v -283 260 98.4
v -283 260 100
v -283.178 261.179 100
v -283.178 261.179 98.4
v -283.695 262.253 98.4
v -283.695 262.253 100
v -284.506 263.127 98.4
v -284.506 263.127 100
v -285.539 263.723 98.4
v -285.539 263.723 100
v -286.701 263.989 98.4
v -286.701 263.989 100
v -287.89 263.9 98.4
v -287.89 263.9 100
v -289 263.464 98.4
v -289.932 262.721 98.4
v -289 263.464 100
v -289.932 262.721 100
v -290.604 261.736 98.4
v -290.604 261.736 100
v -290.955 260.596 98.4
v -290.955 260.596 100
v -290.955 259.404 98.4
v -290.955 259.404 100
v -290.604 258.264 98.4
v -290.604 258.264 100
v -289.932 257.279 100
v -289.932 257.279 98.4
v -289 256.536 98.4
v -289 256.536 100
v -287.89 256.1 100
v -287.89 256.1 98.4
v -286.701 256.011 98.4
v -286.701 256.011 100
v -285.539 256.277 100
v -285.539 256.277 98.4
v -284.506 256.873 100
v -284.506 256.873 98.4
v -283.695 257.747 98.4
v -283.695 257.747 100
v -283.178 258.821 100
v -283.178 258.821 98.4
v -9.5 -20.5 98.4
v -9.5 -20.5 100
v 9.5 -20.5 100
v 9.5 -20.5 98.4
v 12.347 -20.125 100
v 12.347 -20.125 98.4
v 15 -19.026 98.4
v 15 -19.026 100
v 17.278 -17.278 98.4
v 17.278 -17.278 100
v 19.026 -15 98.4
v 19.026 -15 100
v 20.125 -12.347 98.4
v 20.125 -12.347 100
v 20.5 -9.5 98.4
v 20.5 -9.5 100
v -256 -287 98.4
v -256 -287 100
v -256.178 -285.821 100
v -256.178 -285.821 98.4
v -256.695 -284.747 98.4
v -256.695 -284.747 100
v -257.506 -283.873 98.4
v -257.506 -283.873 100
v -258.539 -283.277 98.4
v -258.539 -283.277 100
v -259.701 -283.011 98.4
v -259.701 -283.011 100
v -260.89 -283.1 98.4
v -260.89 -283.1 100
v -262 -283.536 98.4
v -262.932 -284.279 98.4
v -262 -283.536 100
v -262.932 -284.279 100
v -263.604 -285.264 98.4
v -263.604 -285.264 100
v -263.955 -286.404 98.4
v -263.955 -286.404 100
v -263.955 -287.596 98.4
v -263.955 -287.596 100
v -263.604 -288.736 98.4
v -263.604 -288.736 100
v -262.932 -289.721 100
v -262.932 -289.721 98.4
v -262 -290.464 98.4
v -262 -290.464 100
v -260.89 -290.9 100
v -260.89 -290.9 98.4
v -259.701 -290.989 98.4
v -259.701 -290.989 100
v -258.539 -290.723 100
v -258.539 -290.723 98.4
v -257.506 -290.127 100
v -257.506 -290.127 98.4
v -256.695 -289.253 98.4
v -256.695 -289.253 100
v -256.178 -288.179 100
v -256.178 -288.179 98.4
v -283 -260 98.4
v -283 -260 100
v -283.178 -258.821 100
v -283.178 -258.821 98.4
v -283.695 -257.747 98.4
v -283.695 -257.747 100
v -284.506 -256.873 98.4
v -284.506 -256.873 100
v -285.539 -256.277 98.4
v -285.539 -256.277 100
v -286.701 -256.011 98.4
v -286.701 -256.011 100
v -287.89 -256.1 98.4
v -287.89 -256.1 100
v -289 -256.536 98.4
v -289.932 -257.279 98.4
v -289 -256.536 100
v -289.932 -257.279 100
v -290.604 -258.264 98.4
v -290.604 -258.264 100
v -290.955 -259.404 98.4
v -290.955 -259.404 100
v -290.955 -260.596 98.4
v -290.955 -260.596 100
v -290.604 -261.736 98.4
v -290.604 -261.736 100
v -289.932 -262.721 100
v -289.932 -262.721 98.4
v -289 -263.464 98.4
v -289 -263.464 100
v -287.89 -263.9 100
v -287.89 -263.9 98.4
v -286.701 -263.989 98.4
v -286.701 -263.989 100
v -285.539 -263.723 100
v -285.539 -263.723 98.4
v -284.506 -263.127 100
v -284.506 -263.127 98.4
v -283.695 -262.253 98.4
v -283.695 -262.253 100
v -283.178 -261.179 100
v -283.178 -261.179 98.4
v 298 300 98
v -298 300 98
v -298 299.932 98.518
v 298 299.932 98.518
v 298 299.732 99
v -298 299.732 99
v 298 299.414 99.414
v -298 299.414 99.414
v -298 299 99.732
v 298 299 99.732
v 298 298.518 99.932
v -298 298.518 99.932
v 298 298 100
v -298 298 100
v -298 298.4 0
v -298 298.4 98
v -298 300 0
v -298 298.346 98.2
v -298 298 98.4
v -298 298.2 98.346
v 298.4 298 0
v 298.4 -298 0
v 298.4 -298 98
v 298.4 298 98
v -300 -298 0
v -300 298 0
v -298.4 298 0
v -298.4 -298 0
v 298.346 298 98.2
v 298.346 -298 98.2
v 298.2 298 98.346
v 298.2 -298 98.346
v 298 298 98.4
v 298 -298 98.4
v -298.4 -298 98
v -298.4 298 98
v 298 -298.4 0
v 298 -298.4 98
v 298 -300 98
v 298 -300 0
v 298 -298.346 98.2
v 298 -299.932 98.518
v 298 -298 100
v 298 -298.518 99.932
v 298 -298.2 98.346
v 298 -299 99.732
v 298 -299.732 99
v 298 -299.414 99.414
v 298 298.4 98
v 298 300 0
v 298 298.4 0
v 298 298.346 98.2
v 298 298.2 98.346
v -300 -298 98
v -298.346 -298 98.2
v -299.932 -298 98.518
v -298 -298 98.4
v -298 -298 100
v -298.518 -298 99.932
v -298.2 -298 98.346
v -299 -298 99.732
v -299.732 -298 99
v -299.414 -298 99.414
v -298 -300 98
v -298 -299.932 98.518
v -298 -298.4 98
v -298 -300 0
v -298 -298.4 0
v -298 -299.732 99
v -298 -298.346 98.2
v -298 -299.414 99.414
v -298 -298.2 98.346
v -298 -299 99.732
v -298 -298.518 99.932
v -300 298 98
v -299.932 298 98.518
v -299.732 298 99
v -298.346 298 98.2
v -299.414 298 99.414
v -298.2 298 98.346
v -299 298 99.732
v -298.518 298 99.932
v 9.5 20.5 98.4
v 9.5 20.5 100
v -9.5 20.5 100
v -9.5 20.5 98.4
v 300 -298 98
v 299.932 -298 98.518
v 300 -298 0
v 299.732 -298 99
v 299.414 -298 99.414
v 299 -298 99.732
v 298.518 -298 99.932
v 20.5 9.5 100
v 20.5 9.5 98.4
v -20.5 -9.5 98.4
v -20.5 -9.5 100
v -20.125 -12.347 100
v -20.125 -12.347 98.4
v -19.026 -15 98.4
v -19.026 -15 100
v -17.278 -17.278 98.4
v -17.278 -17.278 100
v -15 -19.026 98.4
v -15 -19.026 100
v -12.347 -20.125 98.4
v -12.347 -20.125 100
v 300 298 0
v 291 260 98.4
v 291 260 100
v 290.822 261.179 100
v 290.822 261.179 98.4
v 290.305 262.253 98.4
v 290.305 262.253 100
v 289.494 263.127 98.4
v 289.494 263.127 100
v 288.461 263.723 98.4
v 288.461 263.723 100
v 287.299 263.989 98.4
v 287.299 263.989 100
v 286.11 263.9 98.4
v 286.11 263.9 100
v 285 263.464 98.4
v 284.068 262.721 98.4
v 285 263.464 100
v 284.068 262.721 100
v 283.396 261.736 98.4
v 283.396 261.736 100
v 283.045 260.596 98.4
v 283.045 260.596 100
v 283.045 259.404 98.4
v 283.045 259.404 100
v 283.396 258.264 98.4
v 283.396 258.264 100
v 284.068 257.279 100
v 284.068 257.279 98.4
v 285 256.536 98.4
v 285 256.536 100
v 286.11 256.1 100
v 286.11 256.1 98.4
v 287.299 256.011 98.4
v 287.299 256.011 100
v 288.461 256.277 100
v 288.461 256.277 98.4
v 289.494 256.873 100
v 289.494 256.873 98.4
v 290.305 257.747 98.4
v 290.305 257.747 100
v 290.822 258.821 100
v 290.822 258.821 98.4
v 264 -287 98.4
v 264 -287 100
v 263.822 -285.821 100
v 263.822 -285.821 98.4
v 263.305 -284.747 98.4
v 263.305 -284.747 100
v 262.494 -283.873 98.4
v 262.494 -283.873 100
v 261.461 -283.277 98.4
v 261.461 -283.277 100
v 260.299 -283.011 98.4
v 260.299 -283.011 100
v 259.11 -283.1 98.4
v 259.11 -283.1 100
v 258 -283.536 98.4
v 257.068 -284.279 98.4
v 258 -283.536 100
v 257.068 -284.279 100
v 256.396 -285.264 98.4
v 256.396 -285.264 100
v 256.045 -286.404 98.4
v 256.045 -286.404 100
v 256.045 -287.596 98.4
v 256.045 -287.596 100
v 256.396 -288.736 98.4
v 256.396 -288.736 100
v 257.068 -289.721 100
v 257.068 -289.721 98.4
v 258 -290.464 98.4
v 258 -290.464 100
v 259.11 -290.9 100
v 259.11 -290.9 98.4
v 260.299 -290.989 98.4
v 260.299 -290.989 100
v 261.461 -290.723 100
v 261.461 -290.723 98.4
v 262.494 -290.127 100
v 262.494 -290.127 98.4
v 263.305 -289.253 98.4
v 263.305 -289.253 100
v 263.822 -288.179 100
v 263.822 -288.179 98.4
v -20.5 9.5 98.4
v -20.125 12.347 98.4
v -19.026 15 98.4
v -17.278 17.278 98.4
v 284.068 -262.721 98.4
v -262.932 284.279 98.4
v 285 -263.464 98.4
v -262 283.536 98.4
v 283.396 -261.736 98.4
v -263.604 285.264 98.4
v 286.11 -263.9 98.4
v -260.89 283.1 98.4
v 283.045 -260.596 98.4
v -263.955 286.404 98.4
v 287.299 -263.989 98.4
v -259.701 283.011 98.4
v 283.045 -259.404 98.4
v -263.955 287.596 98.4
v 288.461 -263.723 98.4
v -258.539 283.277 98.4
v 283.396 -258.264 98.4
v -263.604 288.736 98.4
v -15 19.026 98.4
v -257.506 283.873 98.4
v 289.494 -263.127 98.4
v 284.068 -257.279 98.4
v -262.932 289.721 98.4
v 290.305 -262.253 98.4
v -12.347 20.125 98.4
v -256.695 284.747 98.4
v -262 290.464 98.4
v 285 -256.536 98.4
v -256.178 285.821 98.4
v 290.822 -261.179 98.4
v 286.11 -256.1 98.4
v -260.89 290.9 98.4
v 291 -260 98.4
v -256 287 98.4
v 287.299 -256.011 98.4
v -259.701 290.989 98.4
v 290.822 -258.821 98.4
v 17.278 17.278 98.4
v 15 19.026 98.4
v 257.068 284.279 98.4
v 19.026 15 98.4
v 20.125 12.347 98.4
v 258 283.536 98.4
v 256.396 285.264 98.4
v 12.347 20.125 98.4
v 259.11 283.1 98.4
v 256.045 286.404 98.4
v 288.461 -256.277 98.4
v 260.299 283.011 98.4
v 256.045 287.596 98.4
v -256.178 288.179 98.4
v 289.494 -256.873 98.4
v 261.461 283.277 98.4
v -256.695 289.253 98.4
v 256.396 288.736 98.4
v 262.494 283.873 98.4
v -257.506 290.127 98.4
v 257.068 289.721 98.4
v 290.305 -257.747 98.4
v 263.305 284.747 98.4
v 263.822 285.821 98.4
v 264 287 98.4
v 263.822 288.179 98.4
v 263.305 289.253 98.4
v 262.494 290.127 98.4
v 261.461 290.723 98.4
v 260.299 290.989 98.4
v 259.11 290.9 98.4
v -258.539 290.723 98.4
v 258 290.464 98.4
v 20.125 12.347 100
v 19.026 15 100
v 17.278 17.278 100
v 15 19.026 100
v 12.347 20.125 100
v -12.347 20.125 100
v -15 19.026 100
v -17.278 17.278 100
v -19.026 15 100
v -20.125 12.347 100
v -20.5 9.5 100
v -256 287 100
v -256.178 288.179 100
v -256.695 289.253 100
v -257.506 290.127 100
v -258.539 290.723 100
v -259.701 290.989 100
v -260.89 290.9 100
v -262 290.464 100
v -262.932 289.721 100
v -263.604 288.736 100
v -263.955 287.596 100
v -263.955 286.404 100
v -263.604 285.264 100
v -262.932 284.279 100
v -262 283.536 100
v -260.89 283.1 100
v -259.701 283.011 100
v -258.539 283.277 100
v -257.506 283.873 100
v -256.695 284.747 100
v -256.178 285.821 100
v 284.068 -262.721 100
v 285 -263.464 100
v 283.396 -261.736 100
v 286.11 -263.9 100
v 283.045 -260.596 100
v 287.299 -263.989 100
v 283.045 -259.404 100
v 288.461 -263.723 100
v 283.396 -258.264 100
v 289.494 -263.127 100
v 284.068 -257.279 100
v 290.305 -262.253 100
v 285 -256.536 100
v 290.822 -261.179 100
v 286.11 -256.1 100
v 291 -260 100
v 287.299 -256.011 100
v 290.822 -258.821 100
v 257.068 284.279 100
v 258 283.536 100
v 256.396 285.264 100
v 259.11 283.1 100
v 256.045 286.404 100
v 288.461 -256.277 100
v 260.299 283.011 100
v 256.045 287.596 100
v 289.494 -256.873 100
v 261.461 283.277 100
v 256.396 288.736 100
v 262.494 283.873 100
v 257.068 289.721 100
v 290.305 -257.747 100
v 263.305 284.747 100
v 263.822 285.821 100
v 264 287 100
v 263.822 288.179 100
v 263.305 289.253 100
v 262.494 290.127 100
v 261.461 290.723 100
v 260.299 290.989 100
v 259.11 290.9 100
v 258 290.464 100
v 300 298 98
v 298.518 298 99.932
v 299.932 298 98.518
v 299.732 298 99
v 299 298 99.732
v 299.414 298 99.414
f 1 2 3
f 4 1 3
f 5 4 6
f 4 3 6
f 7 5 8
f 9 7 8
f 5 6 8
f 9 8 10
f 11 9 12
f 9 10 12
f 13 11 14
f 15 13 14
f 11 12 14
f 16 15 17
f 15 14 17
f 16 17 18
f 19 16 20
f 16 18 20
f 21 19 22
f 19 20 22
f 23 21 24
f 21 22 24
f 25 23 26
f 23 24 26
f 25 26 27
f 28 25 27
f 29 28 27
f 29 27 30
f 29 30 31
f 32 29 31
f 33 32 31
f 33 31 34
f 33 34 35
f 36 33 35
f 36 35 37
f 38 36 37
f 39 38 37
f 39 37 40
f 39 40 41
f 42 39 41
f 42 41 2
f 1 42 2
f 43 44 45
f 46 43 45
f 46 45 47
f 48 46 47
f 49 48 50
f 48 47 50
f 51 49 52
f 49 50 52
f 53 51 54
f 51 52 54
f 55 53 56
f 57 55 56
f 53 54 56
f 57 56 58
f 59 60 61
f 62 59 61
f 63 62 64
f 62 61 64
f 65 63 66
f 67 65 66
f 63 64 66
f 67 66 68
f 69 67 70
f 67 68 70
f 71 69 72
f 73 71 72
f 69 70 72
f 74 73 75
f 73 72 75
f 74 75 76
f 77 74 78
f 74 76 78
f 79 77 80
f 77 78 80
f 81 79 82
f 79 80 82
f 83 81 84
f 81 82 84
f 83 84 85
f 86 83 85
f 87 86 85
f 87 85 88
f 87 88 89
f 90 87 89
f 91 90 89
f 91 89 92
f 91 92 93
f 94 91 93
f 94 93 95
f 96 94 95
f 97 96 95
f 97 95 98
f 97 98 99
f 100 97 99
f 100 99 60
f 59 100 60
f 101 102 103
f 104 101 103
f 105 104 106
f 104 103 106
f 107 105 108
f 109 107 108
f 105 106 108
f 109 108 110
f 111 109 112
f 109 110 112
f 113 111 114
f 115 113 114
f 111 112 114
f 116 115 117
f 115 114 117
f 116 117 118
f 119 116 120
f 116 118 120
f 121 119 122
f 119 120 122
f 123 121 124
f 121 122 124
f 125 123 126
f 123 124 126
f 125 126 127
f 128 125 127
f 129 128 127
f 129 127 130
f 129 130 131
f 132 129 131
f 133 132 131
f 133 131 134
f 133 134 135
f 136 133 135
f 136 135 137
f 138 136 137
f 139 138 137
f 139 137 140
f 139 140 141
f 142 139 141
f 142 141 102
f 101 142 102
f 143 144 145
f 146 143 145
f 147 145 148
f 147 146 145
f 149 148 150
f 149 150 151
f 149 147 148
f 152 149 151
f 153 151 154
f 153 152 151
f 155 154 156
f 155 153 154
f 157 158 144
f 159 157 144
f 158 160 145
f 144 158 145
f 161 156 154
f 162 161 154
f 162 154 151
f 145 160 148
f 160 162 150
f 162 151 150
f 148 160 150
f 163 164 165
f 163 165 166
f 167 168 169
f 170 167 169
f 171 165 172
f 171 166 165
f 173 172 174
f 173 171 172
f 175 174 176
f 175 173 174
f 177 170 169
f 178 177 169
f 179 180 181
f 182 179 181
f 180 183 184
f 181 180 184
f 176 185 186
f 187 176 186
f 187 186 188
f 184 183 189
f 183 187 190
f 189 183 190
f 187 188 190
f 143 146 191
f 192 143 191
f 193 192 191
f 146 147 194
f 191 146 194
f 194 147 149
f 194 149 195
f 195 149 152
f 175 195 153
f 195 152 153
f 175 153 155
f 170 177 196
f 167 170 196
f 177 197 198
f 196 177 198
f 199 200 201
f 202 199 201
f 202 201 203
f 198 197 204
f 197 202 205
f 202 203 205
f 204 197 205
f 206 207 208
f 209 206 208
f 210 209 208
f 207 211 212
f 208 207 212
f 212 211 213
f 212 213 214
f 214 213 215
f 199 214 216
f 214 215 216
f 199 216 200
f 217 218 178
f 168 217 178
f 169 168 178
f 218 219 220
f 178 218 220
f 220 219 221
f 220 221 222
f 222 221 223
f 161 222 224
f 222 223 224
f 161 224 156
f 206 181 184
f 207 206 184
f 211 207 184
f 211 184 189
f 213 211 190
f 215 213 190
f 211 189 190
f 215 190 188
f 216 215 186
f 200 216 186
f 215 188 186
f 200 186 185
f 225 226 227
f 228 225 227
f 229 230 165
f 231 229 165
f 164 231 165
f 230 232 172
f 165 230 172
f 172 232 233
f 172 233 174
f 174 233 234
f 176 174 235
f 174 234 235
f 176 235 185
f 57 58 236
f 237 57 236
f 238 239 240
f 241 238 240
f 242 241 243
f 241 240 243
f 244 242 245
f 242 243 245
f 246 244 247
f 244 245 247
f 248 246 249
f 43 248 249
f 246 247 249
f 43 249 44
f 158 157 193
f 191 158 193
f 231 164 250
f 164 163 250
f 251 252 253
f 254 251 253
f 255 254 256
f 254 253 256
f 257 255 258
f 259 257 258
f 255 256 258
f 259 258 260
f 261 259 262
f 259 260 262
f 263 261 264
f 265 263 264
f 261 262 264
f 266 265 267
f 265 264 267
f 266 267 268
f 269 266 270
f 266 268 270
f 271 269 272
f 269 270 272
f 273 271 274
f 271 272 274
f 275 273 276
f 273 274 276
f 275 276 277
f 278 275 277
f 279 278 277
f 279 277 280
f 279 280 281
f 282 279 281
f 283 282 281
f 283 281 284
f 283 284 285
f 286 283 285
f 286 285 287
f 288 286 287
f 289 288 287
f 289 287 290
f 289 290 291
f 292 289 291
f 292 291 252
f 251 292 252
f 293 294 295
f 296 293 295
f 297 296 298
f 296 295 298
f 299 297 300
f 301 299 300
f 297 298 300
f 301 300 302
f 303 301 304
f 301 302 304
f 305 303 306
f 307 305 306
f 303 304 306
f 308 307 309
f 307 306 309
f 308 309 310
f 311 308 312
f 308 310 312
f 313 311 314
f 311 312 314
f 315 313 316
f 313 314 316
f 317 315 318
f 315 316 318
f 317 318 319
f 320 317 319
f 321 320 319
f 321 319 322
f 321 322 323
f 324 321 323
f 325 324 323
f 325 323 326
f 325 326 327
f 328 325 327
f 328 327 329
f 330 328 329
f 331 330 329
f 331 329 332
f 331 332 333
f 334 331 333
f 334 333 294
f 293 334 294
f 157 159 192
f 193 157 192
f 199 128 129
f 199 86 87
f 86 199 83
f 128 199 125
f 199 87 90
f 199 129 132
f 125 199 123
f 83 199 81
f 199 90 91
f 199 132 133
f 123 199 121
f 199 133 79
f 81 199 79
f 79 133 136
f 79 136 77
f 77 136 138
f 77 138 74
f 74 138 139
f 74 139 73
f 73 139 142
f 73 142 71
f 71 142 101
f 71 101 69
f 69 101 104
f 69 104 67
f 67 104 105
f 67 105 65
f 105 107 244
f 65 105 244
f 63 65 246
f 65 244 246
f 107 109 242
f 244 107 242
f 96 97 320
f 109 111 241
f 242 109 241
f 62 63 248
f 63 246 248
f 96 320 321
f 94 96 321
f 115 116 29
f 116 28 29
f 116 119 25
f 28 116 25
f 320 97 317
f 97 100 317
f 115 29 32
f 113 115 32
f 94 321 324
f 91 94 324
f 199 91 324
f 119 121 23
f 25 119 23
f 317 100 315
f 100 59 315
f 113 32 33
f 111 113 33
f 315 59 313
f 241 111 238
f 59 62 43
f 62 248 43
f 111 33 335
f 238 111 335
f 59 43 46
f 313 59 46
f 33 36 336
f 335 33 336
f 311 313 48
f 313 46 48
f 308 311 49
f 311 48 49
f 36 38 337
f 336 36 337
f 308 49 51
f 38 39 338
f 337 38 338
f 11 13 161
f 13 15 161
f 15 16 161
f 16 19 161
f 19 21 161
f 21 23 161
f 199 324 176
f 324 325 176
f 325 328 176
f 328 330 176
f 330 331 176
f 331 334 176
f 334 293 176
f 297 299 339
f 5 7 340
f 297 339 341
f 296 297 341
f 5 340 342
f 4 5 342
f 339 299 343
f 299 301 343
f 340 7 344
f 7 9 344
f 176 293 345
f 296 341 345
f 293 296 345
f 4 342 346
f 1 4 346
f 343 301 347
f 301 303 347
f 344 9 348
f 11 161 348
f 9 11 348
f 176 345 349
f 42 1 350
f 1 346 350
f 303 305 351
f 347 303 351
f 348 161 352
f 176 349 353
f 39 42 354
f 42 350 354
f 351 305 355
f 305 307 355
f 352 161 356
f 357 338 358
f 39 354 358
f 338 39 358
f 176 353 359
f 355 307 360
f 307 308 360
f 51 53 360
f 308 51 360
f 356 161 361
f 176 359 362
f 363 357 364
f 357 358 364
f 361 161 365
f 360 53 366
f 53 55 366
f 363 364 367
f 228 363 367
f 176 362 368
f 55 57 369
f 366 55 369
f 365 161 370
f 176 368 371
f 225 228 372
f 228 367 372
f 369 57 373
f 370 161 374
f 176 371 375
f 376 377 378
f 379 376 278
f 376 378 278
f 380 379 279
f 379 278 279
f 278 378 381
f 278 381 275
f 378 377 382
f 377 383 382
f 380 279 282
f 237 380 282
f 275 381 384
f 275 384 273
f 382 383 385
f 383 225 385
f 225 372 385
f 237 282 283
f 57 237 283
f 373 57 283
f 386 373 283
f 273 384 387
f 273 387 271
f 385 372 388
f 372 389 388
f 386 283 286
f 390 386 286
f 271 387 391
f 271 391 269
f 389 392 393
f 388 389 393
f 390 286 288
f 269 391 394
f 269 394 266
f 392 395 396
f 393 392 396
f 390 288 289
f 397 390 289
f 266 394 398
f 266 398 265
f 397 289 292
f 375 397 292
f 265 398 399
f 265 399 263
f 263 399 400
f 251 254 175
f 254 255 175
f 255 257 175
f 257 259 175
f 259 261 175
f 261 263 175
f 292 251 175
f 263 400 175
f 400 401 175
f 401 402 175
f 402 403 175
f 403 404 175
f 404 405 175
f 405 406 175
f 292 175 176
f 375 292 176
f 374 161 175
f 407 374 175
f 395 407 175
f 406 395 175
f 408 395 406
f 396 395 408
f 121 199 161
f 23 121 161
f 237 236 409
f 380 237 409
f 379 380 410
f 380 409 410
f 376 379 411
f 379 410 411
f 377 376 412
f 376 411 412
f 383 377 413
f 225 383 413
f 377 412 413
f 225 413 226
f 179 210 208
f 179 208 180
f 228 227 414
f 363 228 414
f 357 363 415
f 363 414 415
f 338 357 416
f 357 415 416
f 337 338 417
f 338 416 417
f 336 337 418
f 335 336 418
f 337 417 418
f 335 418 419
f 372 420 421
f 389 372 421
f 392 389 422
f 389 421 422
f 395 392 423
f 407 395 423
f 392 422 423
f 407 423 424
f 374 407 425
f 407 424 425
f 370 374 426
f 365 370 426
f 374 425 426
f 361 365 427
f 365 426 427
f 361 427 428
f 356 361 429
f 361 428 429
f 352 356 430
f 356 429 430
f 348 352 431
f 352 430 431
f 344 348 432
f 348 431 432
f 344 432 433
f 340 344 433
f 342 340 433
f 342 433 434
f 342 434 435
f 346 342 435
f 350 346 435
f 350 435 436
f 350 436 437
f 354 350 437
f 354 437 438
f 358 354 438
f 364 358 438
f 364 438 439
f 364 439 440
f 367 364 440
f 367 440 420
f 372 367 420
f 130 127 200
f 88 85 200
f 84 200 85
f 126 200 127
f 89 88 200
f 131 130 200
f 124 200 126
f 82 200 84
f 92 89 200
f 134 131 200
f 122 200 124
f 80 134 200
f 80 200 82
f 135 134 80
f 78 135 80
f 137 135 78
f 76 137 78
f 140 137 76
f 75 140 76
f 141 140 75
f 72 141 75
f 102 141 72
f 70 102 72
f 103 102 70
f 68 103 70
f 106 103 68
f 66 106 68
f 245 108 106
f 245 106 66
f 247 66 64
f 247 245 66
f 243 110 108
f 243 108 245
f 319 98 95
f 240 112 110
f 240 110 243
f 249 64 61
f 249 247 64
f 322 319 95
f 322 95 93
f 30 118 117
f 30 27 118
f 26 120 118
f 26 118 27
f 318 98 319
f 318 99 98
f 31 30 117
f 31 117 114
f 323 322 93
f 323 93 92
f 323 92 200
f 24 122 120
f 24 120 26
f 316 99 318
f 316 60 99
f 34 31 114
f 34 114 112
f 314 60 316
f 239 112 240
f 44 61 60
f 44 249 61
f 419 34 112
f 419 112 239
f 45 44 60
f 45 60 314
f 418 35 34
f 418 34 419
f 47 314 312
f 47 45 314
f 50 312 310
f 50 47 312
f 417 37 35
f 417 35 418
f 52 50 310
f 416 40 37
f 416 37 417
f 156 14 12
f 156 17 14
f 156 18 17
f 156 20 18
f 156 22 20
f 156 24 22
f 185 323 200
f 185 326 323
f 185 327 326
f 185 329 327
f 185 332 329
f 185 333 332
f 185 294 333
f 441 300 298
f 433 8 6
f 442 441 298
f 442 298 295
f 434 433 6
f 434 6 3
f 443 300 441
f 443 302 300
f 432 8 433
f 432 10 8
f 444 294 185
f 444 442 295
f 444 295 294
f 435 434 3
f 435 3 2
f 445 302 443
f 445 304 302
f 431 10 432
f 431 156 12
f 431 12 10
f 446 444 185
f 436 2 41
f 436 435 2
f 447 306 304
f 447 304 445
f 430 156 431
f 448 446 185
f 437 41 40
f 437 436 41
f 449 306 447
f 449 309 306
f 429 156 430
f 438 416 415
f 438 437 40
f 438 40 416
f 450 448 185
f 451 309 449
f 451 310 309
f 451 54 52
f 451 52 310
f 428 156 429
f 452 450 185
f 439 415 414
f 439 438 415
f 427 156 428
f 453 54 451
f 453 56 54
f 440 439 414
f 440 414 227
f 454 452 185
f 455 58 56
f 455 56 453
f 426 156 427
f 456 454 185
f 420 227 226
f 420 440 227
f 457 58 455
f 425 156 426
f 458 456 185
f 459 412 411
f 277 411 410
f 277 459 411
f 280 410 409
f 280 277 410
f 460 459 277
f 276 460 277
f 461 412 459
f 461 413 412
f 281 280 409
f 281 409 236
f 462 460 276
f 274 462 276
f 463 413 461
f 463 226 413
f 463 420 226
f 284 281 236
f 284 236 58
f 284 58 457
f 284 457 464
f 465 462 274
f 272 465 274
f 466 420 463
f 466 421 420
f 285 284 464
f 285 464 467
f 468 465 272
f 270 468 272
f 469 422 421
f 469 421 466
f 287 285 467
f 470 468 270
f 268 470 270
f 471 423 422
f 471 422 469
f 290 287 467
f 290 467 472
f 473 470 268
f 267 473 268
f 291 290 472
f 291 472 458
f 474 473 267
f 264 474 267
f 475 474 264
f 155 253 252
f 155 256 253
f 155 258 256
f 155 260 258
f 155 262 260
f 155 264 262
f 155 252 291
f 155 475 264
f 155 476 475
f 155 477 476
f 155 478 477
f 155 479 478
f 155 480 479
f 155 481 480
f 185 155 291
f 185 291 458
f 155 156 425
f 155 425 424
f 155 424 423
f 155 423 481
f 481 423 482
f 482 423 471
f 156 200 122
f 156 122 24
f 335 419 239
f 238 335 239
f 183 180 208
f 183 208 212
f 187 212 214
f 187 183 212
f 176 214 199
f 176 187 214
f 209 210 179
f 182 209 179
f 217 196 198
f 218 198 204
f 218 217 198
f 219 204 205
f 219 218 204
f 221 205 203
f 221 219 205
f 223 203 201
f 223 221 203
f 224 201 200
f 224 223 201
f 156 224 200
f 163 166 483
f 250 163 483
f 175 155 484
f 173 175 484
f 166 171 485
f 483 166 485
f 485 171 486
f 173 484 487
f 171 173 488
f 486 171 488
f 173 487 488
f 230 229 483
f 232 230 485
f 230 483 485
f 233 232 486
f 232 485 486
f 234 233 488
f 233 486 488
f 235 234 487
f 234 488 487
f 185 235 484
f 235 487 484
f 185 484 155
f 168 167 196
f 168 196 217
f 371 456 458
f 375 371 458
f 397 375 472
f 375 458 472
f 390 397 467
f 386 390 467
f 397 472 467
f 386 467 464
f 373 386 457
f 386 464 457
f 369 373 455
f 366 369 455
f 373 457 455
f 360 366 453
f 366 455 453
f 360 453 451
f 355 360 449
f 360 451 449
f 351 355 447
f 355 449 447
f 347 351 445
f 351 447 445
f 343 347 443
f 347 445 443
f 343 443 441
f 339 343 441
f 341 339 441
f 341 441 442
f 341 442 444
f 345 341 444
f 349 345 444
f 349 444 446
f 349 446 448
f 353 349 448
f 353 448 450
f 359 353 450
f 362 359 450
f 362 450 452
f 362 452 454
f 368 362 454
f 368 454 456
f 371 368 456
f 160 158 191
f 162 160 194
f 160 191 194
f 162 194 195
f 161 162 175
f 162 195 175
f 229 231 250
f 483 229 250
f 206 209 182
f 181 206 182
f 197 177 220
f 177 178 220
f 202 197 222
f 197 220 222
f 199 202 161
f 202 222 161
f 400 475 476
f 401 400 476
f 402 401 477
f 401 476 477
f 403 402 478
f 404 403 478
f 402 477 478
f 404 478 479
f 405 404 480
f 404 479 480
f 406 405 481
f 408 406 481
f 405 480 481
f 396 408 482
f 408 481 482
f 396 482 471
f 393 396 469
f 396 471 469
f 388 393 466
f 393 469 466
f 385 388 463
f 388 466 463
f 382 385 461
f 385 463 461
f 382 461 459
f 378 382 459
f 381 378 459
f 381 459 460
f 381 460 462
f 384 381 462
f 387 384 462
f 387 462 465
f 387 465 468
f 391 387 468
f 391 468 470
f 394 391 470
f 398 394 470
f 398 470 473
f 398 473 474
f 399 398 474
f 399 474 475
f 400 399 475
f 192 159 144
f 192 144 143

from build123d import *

# Parameters (mm, degrees)
F0_W      = 600
F0_H      = 600
F1_DEPTH  = 100
F3_R      = 2
F4_T      = -1.6
F6_DEPTH  = 100.001
F8_DEPTH  = 100.001
F9_R      = 4
F10_DEPTH = 100.001


with BuildPart() as f1:
    # F0 (on Top) → F1 (new body)
    with BuildSketch(Plane.XY):
        Rectangle(F0_W, F0_H)
    extrude(amount=F1_DEPTH)

    # F3
    f3_edges = [f1.edges().sort_by_distance(p)[0] for p in [
        (0, -300, 100),
        (-300, -300, 50),
        (-300, 0, 100),
        (300, -300, 50),
        (-300, 300, 50),
        (300, 0, 100),
        (0, 300, 100),
        (300, 300, 50),
    ]]
    fillet(f3_edges, radius=F3_R)

    # F4
    f4_openings = [f1.faces().sort_by_distance(p)[0] for p in [
        (0, 0, 0),
    ]]
    offset(amount=F4_T, openings=f4_openings)

    # F5 (on face) → F6 (cut, through all)
    with BuildSketch(Plane.XY.offset(100)):
        with BuildLine():
            Line((298, 300), (298, 298))
            Line((298, 298), (300, 298))
            ThreePointArc((300, 298), (299.414214, 299.414214), (298, 300))
        make_face()
        with BuildLine():
            Line((298, -298), (298, -300))
            ThreePointArc((298, -300), (299.414214, -299.414214), (300, -298))
            Line((300, -298), (298, -298))
        make_face()
        with BuildLine():
            Line((-300, 298), (-298, 298))
            Line((-298, 298), (-298, 300))
            ThreePointArc((-298, 300), (-299.414214, 299.414214), (-300, 298))
        make_face()
        with BuildLine():
            ThreePointArc((-300, -298), (-299.414214, -299.414214), (-298, -300))
            Line((-298, -300), (-298, -298))
            Line((-298, -298), (-300, -298))
        make_face()
    extrude(amount=-F6_DEPTH, mode=Mode.SUBTRACT)

    # F7 (on face) → F8 (cut, through all)
    with BuildSketch(Plane.XY.offset(100)):
        with BuildLine():
            ThreePointArc((-20.5, -9.5), (-17.278175, -17.278175), (-9.5, -20.5))
            Line((-9.5, -20.5), (9.5, -20.5))
            ThreePointArc((9.5, -20.5), (17.278175, -17.278175), (20.5, -9.5))
            Line((20.5, -9.5), (20.5, 9.5))
            ThreePointArc((20.5, 9.5), (17.278175, 17.278175), (9.5, 20.5))
            Line((9.5, 20.5), (-9.5, 20.5))
            ThreePointArc((-9.5, 20.5), (-17.278175, 17.278175), (-20.5, 9.5))
            Line((-20.5, 9.5), (-20.5, -9.5))
        make_face()
    extrude(amount=-F8_DEPTH, mode=Mode.SUBTRACT)

    # F9 (on face) → F10 (cut, through all)
    with BuildSketch(Plane.XY.offset(100)):
        with Locations((260, 287)):
            Circle(F9_R)
        with Locations((-260, 287)):
            Circle(F9_R)
        with Locations((-287, -260)):
            Circle(F9_R)
        with Locations((-287, 260)):
            Circle(F9_R)
        with Locations((260, -287)):
            Circle(F9_R)
        with Locations((-260, -287)):
            Circle(F9_R)
        with Locations((287, 260)):
            Circle(F9_R)
        with Locations((287, -260)):
            Circle(F9_R)
    extrude(amount=-F10_DEPTH, mode=Mode.SUBTRACT)


solid = f1.part
